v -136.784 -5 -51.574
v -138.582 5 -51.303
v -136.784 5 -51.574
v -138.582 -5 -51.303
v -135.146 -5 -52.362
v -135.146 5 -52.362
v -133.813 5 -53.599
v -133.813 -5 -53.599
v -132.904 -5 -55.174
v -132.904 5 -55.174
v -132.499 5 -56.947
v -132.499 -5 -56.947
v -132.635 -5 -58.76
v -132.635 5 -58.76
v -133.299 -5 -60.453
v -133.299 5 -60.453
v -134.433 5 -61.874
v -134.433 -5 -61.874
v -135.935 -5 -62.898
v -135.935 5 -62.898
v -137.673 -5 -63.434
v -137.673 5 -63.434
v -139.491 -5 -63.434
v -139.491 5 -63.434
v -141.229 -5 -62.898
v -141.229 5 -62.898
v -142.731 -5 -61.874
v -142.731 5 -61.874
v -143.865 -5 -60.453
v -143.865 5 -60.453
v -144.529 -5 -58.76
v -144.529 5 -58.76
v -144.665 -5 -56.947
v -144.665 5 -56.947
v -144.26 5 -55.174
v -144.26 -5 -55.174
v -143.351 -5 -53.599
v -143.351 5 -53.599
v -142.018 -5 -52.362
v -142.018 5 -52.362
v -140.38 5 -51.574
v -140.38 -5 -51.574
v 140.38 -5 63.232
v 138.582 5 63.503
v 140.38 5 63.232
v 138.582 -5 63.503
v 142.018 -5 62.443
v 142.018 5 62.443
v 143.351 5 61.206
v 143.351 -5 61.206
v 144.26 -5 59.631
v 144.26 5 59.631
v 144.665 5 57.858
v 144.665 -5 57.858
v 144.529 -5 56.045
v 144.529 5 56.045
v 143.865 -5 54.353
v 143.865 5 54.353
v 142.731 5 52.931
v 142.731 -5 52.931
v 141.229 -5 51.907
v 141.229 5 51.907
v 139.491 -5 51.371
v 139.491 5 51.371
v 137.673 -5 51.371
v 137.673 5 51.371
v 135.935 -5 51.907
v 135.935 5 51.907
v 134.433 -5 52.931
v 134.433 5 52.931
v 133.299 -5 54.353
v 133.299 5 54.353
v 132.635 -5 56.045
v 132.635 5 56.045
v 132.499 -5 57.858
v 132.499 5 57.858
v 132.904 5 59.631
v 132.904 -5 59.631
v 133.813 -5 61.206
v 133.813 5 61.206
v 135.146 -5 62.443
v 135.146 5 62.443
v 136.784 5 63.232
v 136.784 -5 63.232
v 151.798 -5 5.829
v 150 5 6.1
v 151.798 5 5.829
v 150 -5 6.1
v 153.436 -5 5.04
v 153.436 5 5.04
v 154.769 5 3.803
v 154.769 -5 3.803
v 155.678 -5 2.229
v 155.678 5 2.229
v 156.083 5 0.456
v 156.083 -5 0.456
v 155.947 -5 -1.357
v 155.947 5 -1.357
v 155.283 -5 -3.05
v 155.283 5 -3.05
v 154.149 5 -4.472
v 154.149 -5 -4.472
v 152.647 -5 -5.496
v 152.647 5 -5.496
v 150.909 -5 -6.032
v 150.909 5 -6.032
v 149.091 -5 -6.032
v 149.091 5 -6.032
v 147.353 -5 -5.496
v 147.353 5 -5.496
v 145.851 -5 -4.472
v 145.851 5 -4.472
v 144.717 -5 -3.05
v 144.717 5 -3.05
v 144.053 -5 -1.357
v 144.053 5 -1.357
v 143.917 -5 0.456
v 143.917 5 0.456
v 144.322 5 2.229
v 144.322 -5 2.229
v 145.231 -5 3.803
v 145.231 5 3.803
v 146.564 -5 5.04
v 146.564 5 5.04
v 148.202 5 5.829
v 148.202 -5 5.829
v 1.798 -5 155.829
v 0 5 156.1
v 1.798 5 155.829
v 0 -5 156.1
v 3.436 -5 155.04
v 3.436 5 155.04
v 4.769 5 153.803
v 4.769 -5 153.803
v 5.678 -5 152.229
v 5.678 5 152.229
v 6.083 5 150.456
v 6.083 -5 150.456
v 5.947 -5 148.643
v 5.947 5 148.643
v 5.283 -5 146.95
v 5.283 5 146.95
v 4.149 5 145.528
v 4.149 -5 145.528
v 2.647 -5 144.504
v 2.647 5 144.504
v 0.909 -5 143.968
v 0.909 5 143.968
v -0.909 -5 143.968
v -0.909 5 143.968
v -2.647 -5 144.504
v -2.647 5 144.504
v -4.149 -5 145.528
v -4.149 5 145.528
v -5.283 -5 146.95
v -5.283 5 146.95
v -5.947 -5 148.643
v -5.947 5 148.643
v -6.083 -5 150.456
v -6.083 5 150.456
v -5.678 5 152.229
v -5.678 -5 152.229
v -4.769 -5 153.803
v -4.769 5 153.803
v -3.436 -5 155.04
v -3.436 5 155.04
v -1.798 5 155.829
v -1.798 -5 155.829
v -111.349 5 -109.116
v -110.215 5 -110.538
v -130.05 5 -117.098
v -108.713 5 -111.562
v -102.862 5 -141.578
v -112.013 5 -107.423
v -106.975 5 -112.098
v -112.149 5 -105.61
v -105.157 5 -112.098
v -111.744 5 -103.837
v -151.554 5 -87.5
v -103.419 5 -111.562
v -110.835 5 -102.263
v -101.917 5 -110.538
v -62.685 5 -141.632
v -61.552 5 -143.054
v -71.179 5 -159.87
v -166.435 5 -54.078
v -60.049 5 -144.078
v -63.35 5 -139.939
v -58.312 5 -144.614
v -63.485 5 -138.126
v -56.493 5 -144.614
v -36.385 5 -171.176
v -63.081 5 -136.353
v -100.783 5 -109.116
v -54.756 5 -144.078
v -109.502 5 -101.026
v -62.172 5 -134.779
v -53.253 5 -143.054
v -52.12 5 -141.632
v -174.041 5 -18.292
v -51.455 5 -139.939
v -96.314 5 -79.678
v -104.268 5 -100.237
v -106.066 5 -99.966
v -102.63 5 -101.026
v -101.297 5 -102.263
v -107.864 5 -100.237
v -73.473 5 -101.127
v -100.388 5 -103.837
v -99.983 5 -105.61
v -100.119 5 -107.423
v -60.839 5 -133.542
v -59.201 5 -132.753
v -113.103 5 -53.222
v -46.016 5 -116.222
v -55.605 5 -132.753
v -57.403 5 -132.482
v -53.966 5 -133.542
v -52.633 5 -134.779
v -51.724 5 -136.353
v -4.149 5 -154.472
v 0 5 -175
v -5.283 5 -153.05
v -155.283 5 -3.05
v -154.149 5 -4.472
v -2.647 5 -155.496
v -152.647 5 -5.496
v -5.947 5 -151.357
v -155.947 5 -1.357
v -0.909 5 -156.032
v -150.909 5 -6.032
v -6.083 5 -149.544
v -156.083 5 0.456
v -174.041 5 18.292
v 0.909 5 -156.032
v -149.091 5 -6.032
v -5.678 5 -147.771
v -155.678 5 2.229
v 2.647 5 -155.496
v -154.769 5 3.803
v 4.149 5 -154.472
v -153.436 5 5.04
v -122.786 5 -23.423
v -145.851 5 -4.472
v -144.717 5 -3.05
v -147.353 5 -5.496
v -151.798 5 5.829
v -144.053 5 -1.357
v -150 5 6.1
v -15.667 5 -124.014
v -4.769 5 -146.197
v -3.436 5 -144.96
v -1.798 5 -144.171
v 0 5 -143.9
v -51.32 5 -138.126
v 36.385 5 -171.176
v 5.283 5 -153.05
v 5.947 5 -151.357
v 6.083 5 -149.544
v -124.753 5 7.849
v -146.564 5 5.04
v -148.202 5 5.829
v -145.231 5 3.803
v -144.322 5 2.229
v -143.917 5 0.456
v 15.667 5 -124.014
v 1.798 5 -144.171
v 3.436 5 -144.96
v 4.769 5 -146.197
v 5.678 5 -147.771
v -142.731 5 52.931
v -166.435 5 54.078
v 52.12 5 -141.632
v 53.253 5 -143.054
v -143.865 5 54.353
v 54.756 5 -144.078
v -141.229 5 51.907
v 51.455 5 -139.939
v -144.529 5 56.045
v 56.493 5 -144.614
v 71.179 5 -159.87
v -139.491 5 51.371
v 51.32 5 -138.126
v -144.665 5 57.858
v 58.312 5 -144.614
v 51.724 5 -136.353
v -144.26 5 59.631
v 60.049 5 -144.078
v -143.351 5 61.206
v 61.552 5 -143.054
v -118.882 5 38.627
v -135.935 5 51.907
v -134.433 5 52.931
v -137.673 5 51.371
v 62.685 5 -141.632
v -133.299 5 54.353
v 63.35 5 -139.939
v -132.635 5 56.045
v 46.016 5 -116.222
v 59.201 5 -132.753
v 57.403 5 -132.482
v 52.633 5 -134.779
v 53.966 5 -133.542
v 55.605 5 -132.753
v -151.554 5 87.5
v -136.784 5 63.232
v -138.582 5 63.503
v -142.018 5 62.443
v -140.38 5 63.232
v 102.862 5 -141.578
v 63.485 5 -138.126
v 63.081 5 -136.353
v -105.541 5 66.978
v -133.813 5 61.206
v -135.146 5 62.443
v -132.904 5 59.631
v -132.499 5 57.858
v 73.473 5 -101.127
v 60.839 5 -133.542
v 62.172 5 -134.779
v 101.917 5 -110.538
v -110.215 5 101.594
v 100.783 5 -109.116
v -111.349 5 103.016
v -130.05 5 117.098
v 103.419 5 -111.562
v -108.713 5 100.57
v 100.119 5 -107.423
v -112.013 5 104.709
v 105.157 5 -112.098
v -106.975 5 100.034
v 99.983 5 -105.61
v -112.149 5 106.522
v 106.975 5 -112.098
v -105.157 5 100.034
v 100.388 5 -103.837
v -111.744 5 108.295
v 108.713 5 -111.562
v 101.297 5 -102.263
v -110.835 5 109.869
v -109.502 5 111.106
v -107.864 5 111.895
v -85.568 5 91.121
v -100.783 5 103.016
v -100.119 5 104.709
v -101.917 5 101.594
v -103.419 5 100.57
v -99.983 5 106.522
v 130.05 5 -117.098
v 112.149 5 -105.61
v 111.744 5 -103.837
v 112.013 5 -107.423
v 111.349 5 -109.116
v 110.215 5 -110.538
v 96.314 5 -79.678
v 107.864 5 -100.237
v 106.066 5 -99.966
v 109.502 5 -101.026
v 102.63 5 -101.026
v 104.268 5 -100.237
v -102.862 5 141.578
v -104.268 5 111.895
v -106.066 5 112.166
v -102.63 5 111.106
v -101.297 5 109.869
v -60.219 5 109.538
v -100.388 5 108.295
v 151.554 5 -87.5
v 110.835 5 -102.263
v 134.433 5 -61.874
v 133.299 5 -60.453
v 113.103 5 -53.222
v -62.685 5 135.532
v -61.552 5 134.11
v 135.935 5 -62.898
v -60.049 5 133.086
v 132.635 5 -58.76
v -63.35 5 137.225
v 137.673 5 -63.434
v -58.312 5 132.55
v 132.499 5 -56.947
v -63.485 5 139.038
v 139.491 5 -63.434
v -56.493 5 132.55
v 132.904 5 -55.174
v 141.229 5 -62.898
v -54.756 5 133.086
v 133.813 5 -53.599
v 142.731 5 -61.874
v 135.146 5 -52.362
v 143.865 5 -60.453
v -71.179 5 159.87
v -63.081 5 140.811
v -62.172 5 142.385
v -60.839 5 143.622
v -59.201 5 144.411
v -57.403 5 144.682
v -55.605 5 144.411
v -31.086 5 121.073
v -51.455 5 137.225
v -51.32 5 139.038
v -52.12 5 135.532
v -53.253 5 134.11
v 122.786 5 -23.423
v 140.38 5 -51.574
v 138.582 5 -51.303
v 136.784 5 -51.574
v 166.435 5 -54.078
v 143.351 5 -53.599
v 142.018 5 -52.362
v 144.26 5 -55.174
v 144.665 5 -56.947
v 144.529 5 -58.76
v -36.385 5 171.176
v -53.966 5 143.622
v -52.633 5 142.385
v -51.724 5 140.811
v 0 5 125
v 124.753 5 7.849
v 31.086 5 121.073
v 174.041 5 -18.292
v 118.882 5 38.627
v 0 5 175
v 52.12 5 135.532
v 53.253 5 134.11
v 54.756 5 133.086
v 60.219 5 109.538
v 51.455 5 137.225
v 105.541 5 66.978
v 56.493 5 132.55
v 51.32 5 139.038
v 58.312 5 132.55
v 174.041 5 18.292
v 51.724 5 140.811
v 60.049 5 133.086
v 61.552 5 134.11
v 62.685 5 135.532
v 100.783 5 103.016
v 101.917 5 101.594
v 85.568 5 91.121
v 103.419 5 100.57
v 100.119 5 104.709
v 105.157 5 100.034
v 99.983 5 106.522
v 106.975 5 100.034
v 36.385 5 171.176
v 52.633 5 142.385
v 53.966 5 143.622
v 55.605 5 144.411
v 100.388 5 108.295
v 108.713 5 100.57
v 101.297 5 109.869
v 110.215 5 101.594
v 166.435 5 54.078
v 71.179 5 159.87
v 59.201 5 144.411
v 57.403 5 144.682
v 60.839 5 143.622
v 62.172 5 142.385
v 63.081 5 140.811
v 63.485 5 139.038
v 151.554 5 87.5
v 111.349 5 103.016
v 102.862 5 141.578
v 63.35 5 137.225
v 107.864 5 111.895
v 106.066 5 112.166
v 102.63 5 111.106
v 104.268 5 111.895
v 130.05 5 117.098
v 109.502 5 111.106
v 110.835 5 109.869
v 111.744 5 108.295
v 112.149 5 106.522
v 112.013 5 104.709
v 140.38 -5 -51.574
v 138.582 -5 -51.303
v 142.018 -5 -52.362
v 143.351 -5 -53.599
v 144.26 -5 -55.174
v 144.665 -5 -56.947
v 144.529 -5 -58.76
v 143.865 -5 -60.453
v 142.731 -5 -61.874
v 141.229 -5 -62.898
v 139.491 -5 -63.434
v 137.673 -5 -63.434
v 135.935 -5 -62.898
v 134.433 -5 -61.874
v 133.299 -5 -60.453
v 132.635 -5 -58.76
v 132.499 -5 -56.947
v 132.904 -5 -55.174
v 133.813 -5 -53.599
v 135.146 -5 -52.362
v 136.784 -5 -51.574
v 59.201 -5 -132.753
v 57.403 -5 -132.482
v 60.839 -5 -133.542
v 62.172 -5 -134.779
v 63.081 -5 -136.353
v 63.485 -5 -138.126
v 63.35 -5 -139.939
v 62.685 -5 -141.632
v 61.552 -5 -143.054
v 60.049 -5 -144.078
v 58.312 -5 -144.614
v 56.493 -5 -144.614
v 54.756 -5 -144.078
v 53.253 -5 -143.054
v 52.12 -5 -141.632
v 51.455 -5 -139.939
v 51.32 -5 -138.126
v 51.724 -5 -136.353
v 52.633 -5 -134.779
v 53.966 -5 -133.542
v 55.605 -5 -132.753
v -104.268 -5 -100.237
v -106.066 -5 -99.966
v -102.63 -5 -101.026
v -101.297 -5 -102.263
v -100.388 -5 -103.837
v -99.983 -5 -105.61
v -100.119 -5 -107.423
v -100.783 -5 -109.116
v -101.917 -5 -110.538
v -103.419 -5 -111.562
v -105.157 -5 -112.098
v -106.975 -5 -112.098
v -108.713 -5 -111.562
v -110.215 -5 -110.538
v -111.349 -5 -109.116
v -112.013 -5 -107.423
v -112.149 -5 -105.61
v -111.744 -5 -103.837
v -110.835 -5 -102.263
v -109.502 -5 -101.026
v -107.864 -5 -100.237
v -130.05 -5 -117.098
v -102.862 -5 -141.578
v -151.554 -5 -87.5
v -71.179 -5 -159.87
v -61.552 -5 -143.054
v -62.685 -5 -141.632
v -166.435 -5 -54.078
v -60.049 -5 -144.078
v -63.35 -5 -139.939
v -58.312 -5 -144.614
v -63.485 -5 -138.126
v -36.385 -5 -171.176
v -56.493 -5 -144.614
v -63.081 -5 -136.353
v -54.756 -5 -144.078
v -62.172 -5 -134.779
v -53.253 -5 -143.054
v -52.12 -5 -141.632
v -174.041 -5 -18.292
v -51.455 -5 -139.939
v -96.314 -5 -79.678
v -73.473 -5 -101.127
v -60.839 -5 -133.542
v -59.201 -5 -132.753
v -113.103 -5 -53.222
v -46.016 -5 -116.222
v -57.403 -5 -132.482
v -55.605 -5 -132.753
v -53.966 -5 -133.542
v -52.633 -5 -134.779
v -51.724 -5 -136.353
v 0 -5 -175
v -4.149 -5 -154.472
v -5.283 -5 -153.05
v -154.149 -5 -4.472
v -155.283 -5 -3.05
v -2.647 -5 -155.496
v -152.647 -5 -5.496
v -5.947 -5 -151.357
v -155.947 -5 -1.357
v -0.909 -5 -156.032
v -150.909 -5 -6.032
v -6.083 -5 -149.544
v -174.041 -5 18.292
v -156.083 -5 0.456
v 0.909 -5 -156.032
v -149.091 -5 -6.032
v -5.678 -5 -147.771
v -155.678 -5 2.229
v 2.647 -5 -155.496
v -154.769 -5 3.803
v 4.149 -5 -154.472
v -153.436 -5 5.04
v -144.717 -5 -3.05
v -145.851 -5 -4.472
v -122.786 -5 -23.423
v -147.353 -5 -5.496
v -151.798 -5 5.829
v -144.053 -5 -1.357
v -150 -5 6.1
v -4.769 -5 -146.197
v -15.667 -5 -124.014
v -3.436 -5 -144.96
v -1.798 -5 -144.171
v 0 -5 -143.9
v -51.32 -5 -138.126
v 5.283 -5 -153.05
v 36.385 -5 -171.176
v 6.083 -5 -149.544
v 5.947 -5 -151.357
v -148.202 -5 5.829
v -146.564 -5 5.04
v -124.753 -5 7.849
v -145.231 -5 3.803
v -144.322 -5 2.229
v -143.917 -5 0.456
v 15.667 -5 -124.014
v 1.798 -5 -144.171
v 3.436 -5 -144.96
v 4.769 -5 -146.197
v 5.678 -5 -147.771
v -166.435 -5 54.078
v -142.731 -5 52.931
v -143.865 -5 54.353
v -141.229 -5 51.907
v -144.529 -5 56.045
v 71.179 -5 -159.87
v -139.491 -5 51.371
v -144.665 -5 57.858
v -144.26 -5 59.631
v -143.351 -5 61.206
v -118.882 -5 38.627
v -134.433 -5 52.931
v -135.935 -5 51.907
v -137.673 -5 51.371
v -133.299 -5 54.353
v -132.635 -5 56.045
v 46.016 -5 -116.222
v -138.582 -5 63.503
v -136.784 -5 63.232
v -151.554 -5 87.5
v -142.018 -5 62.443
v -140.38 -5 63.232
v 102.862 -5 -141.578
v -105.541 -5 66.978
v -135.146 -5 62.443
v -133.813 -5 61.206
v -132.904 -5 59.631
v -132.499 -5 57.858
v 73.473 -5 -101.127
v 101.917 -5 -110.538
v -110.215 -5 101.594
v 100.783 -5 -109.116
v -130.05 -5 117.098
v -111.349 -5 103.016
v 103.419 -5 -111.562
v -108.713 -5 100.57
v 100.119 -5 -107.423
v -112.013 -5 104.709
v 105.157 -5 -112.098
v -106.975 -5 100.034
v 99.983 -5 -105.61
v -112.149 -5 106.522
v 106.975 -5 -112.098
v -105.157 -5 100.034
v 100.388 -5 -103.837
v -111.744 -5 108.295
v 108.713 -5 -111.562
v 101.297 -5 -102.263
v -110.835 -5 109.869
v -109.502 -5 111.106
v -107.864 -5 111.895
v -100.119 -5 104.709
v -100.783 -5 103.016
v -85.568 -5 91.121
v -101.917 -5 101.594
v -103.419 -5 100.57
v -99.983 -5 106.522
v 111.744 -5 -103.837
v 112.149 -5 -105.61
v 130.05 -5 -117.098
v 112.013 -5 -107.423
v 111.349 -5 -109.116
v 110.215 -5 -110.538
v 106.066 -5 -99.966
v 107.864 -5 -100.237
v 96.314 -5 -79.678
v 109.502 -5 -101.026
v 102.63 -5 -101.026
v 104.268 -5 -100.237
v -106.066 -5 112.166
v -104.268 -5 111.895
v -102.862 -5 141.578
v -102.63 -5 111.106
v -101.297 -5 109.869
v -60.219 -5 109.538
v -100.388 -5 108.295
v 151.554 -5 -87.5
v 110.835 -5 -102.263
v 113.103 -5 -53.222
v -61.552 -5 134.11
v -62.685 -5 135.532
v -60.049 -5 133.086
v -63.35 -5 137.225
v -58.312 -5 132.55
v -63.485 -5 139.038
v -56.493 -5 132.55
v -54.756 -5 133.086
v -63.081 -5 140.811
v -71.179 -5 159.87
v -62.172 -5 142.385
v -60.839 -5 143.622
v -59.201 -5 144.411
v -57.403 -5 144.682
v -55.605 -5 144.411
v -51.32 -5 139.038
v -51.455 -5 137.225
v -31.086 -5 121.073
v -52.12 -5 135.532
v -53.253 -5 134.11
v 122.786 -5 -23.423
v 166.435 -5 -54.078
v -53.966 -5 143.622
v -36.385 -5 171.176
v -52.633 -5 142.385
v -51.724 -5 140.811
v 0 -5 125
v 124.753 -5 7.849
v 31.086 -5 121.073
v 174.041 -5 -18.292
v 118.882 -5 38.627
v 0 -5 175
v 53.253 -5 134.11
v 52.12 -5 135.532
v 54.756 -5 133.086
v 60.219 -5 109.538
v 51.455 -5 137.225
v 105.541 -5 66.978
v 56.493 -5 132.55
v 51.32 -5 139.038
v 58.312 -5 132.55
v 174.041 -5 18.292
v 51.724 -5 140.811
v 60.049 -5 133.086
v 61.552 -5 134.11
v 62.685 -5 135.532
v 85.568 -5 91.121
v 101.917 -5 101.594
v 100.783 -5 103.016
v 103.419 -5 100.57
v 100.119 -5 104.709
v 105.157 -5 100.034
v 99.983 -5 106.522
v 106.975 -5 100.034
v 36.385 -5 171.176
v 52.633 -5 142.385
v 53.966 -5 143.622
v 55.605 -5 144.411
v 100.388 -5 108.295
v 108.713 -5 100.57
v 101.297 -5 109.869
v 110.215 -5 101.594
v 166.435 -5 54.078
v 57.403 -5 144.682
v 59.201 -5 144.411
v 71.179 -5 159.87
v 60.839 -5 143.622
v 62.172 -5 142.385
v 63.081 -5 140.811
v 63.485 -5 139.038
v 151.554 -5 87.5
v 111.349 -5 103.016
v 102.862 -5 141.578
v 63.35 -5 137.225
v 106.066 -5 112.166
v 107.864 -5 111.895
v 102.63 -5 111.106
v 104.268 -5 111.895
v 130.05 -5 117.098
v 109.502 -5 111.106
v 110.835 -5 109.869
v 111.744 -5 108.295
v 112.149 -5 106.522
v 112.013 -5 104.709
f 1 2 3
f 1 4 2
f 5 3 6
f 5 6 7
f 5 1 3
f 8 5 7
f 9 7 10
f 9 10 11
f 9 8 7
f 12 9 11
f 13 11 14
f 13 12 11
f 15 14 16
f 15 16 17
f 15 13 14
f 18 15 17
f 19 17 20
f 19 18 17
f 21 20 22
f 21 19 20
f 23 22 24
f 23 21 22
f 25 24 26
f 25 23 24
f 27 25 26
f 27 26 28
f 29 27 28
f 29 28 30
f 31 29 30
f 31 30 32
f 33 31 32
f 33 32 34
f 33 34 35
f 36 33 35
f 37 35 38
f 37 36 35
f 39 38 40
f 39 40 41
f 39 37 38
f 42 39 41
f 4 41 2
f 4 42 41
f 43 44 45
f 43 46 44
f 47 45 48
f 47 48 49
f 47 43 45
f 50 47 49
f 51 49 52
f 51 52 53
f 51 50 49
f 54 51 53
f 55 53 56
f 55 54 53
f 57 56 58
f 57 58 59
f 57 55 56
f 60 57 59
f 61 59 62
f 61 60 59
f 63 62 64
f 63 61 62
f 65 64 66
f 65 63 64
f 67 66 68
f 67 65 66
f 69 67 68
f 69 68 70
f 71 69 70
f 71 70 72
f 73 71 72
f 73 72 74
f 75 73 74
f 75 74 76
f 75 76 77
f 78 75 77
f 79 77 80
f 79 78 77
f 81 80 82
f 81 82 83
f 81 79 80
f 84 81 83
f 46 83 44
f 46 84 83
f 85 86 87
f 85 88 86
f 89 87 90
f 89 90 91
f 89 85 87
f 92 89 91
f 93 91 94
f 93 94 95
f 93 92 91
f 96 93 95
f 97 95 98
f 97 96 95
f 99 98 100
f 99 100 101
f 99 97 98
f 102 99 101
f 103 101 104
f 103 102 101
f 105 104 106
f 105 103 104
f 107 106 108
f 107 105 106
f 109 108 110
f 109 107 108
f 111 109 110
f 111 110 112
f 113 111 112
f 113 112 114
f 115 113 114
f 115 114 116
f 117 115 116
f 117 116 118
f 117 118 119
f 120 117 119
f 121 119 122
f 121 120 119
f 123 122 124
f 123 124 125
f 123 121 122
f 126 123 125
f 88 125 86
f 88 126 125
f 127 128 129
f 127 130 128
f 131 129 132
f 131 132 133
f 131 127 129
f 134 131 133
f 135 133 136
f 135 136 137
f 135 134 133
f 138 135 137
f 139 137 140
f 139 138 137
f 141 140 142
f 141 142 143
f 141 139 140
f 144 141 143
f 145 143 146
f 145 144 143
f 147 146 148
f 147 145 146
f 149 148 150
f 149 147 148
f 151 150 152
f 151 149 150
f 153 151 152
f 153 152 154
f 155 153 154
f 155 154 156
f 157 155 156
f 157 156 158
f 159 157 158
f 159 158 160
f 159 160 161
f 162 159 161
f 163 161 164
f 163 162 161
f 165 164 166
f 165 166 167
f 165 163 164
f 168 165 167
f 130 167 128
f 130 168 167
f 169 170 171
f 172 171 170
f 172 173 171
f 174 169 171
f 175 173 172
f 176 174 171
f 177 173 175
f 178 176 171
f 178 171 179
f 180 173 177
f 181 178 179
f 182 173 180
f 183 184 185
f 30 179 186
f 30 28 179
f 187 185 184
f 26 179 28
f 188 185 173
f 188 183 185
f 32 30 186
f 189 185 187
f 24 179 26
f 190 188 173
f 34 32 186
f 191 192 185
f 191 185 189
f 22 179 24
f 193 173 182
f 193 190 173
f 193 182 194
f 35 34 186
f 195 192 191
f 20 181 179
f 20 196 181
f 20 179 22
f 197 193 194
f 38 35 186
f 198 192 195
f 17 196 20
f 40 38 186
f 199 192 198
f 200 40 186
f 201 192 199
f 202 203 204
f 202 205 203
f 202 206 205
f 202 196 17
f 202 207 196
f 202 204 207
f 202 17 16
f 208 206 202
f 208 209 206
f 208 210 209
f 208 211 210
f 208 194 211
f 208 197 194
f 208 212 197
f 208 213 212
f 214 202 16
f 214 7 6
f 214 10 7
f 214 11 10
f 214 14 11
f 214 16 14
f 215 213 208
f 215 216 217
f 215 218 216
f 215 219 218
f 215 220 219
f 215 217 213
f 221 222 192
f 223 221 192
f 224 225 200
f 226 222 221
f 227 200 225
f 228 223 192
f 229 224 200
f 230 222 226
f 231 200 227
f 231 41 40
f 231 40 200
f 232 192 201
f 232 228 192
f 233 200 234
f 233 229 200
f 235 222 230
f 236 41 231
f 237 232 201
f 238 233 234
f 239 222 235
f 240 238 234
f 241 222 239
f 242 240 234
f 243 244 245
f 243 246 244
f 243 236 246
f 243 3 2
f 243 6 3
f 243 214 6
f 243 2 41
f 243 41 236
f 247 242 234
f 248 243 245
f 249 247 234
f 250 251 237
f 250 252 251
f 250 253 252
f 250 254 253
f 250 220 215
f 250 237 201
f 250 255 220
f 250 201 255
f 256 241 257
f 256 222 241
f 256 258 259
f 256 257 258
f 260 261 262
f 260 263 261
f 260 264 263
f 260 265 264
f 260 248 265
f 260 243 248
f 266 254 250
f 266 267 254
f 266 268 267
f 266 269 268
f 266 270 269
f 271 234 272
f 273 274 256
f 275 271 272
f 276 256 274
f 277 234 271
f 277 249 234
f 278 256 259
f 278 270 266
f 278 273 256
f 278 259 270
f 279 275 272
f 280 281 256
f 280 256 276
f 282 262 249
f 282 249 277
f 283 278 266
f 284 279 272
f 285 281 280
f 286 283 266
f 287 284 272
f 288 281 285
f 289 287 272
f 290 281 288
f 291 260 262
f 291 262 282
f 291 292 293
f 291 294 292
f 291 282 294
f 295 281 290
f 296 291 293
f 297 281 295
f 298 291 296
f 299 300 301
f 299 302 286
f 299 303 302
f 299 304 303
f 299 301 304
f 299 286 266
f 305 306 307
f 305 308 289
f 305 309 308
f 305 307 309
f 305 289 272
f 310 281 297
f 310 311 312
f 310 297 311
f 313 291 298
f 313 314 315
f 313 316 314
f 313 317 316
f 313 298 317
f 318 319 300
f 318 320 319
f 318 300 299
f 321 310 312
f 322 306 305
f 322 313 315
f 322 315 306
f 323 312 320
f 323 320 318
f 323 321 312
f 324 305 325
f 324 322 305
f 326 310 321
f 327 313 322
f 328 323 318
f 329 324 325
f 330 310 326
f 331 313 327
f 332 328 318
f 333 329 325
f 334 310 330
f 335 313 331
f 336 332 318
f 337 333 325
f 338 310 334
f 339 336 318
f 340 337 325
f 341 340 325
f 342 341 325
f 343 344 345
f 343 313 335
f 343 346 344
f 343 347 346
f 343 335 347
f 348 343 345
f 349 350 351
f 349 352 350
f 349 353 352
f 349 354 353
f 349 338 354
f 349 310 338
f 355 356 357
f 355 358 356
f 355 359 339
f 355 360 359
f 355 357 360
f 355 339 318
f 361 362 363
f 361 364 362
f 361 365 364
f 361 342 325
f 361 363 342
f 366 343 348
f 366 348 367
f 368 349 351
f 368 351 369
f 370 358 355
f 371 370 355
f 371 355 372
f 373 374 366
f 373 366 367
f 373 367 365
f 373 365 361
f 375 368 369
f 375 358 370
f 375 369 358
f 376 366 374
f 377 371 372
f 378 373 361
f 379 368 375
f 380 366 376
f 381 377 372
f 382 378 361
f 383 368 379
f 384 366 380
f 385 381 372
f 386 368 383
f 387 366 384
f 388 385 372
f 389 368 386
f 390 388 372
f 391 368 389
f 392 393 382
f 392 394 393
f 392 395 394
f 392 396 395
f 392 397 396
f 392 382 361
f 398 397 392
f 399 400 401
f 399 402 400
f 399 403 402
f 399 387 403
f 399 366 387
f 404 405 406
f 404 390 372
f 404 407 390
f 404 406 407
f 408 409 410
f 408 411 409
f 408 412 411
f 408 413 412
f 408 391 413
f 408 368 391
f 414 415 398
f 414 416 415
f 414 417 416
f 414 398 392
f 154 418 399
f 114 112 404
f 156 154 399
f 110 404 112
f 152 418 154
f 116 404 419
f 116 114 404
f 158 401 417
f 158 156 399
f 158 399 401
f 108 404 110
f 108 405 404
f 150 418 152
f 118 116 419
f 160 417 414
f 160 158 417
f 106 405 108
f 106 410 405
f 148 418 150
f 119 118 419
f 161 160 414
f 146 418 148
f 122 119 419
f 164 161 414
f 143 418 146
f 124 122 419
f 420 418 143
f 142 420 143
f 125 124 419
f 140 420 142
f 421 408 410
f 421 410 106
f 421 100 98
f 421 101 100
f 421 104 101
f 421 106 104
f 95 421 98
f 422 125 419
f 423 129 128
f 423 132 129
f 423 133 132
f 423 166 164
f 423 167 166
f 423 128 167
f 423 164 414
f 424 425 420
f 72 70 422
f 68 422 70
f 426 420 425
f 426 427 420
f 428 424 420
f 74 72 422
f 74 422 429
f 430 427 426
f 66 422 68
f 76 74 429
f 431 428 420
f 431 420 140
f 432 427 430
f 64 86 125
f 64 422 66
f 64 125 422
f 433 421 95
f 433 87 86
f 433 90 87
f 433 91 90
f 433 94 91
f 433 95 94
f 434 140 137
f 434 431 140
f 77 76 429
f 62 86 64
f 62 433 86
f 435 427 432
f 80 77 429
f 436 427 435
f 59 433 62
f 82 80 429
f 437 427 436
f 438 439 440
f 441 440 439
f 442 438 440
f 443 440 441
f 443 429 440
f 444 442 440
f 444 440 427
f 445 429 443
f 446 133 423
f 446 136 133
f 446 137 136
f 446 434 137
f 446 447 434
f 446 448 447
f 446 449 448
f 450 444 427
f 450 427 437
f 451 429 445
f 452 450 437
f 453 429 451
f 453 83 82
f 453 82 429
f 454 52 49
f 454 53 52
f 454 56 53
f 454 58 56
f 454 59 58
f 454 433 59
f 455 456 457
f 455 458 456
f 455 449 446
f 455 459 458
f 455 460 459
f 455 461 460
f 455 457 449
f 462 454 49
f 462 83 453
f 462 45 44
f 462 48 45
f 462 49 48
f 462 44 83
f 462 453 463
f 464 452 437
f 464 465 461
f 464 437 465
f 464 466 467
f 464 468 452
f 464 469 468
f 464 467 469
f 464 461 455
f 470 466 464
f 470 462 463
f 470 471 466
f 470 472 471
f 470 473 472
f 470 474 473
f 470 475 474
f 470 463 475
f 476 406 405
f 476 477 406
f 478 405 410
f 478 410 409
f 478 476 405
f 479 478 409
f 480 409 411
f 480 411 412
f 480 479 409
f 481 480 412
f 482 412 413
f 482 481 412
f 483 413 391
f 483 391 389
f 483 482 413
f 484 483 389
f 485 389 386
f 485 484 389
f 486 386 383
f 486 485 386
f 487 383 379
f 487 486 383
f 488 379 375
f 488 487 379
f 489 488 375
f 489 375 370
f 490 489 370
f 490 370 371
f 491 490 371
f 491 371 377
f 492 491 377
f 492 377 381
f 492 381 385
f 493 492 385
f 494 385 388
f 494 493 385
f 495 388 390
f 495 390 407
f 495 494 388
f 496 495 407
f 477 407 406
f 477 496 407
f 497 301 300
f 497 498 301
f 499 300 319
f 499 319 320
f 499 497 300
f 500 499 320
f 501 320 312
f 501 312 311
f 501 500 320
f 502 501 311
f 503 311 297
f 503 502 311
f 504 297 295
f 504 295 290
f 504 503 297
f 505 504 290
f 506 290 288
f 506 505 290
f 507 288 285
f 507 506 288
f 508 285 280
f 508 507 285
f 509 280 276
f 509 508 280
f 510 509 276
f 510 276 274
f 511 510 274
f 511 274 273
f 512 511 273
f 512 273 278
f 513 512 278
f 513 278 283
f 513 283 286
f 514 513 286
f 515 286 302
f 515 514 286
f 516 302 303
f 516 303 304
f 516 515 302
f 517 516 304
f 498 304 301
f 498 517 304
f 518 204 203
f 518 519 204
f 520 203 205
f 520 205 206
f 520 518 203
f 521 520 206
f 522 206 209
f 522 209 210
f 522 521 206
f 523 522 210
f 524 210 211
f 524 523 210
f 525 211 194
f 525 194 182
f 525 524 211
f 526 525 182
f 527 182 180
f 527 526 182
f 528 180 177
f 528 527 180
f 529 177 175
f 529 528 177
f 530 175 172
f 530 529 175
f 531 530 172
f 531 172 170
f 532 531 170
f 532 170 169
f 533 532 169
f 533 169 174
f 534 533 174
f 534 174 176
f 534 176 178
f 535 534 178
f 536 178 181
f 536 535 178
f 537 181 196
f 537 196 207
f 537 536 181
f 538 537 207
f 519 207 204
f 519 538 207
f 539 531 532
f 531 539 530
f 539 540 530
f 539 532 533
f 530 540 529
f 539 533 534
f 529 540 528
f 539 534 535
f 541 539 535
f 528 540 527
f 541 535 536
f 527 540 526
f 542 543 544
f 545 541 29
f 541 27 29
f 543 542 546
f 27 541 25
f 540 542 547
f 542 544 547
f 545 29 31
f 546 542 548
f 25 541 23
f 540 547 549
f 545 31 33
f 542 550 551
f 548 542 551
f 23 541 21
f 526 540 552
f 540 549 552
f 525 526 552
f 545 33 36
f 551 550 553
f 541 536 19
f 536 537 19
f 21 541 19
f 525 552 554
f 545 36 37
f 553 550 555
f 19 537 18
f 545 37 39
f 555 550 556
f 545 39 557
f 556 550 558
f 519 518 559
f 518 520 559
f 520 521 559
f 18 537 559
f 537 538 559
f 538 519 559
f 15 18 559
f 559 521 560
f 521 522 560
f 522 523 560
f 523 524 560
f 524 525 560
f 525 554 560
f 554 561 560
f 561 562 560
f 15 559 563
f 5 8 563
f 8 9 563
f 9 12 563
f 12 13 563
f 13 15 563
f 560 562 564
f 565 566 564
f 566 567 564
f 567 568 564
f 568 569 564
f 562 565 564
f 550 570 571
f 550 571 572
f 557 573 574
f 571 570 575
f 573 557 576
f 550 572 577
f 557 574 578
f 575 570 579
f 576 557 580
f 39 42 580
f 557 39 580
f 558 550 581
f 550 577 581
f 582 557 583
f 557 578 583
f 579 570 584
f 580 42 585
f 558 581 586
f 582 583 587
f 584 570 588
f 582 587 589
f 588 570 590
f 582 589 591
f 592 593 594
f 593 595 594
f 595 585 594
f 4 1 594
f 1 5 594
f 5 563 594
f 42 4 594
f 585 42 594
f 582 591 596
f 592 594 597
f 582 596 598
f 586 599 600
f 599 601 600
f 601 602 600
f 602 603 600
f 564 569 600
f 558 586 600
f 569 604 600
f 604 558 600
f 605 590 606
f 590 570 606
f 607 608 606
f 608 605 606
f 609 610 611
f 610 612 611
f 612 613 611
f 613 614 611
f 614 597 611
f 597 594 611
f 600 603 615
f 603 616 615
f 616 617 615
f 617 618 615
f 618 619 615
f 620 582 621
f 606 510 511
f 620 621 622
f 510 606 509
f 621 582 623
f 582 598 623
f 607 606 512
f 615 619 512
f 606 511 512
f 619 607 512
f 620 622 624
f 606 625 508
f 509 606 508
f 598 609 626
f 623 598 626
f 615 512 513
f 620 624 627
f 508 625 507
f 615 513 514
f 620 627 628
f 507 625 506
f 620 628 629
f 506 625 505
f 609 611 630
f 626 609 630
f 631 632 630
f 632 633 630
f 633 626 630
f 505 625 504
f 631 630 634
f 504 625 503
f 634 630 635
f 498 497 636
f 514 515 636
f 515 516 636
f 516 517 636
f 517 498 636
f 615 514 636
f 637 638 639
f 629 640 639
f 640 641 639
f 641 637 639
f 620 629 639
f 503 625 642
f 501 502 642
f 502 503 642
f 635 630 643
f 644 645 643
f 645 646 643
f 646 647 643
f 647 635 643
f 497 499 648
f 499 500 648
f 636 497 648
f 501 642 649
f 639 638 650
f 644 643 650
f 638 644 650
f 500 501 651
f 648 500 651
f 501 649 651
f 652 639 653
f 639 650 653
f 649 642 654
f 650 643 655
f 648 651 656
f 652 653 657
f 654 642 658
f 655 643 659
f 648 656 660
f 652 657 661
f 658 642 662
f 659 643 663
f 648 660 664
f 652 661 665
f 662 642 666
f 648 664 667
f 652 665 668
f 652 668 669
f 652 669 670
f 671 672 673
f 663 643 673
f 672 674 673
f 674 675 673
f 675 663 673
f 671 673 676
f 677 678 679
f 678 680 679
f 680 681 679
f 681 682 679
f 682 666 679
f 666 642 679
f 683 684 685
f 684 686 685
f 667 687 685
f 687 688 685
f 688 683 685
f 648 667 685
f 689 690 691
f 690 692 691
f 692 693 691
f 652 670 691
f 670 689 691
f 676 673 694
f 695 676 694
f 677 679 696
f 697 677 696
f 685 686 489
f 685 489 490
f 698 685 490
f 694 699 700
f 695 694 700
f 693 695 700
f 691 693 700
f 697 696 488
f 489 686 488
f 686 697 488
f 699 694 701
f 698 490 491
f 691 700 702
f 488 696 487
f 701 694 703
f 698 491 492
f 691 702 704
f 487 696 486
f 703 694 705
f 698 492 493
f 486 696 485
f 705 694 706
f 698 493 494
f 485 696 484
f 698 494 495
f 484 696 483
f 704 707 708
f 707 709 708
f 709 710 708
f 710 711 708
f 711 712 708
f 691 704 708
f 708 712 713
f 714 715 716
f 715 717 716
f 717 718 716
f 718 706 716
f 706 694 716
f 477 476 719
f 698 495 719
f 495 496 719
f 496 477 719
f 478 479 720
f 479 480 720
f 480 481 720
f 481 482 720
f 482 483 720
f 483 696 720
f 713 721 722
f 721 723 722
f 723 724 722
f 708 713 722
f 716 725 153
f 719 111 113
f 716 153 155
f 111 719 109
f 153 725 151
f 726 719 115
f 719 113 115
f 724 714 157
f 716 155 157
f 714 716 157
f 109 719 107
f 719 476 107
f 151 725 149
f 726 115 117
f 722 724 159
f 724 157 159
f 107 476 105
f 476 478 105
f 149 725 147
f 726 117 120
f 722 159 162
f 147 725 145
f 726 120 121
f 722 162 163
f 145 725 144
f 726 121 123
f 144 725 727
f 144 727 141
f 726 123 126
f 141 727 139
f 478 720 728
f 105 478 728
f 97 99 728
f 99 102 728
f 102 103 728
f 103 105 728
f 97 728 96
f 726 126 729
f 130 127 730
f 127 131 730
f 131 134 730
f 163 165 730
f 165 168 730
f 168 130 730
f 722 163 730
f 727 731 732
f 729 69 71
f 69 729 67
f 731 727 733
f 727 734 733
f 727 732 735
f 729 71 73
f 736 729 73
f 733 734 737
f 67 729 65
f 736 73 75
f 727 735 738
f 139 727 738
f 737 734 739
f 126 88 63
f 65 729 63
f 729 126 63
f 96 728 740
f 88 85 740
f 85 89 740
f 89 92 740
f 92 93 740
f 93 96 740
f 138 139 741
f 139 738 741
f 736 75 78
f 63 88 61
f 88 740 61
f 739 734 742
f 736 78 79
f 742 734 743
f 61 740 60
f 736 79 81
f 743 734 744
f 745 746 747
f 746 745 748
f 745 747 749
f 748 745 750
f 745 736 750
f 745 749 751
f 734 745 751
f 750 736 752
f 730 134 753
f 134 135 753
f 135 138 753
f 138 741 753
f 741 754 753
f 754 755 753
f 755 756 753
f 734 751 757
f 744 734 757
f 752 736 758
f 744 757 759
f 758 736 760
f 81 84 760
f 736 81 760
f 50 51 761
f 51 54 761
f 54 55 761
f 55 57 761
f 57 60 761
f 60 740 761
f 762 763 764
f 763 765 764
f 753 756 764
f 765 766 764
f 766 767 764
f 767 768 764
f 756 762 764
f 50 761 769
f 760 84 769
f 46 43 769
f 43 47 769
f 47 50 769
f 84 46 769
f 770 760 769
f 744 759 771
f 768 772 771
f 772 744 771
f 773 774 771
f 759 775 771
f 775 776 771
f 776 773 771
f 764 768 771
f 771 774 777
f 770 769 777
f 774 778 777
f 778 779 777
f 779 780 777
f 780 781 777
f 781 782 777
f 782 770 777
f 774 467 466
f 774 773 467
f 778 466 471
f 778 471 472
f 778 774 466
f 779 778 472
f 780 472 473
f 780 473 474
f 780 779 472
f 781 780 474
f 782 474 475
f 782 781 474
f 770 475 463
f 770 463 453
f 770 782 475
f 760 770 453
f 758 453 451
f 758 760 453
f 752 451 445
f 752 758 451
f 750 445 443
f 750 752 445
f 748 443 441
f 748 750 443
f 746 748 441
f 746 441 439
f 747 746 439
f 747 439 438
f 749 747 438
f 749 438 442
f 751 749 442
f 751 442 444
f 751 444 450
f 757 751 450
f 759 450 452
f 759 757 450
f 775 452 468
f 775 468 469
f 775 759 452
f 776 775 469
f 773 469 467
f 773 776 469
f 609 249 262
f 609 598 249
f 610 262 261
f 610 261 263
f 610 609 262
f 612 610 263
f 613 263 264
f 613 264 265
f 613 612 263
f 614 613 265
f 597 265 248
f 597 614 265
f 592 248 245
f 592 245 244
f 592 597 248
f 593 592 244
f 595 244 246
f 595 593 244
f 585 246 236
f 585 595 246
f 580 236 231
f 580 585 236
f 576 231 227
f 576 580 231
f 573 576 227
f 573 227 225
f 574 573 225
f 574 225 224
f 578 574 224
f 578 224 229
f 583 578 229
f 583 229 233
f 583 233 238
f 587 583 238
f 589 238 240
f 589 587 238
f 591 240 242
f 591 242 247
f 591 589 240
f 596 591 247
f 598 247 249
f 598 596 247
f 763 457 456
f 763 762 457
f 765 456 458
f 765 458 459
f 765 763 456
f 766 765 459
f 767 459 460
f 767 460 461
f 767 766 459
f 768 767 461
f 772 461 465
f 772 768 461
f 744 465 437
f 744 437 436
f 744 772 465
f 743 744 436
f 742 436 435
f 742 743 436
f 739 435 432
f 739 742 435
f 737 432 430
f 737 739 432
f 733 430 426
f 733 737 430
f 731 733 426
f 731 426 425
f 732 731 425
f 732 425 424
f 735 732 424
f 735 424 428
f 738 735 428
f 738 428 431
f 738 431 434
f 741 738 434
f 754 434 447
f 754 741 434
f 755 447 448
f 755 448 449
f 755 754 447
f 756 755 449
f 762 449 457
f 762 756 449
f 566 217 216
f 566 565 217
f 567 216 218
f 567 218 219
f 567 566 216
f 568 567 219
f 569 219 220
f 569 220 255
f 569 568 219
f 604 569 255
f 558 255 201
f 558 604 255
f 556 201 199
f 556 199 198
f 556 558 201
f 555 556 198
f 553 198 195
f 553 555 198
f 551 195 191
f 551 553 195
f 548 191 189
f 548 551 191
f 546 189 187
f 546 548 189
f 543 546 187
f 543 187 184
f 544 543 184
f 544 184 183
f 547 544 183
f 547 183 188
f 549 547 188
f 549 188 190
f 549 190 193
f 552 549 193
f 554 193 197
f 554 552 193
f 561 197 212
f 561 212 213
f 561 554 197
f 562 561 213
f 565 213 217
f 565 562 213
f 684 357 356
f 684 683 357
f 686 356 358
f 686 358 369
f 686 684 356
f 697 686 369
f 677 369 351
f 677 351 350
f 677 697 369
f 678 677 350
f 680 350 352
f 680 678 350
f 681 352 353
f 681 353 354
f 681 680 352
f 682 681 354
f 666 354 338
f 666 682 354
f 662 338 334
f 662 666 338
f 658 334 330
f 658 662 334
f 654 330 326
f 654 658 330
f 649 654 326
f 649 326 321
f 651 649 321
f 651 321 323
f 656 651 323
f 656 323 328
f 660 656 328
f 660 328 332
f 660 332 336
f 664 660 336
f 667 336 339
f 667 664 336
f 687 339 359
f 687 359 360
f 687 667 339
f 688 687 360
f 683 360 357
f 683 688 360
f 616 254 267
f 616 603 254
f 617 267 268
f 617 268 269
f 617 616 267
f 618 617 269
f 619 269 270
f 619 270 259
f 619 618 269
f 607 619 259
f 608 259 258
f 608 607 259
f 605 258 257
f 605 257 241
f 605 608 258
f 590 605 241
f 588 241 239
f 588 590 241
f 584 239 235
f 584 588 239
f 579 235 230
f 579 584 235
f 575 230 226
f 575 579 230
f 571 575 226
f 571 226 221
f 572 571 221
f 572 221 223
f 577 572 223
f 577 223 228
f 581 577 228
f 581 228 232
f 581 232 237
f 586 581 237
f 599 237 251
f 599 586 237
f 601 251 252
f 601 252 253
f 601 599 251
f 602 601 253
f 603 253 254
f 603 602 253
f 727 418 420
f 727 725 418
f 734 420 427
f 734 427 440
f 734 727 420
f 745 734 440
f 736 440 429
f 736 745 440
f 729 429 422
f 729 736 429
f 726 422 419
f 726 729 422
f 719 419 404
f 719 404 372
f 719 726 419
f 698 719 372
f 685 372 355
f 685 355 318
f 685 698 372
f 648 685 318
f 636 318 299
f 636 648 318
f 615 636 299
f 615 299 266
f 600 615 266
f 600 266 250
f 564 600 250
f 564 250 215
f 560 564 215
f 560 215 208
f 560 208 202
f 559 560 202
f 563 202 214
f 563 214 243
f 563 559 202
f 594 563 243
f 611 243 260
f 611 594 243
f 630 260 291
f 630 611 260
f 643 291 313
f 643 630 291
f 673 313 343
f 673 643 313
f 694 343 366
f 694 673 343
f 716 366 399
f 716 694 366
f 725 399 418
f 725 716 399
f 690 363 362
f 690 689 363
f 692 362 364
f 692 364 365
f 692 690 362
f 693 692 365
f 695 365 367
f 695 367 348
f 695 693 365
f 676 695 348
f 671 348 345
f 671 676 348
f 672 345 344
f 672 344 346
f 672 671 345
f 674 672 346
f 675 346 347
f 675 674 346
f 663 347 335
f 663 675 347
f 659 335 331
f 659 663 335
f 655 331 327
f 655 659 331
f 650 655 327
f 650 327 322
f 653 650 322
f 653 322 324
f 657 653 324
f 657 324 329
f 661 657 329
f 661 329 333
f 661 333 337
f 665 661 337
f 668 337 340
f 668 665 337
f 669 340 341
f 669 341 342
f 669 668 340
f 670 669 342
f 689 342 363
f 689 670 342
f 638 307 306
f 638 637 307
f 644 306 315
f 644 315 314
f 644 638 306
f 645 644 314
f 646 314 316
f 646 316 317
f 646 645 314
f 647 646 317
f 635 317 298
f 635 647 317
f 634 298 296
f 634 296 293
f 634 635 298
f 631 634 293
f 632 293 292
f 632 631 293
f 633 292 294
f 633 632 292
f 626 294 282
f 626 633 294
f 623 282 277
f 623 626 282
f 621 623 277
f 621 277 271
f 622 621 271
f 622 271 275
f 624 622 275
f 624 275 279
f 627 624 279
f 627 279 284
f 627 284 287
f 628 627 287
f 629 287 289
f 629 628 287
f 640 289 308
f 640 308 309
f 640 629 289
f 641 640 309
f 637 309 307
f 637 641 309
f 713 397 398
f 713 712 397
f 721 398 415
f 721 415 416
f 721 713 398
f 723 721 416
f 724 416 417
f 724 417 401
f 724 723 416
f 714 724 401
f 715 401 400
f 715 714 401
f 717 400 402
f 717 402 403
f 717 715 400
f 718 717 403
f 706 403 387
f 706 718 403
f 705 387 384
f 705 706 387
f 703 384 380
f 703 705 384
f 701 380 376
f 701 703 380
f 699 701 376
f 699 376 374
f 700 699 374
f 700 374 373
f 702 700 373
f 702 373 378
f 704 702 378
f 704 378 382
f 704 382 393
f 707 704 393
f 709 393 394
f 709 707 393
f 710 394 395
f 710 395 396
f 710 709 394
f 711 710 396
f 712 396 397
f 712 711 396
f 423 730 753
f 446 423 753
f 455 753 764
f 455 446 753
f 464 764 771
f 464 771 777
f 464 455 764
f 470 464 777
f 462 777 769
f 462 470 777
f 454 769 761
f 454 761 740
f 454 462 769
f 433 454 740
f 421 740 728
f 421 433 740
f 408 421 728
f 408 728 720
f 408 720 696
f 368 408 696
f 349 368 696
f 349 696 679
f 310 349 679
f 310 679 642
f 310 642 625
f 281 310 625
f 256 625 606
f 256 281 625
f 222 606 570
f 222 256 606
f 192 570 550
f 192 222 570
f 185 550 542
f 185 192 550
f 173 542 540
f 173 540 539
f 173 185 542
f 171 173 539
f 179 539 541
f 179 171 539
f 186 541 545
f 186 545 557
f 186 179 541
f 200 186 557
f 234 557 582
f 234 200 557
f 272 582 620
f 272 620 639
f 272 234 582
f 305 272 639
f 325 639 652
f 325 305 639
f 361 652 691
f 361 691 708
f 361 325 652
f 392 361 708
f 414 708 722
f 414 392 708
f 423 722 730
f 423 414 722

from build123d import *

# Parameters (mm, degrees)
SKETCH1_R           = 175
SKETCH1_R_2         = 125
SKETCH1_R_3         = 6.1
BOSS_EXTRUDE1_DEPTH = 5


with BuildPart() as part:
    # Sketch1 → Boss-Extrude1 (new, symmetric)
    with BuildSketch(Plane(origin=(0, 0, 0), x_dir=(1, 0, 0), z_dir=(0, 1, 0))):
        with Locations(Location((0, 0, 0), (0, 0, 270))):
            Circle(SKETCH1_R)
        with Locations(Location((0, 0, 0), (0, 0, 270))):
            Circle(SKETCH1_R_2, mode=Mode.SUBTRACT)
        with Locations(Location((0, 150, 0), (0, 0, 270))):
            Circle(SKETCH1_R_3, mode=Mode.SUBTRACT)
        with Locations(Location((57.402514855, 138.581929877, 0), (0, 0, 270))):
            Circle(SKETCH1_R_3, mode=Mode.SUBTRACT)
        with Locations(Location((106.066017178, 106.066017178, 0), (0, 0, 270))):
            Circle(SKETCH1_R_3, mode=Mode.SUBTRACT)
        with Locations(Location((138.581929877, 57.402514855, 0), (0, 0, 270))):
            Circle(SKETCH1_R_3, mode=Mode.SUBTRACT)
        with Locations(Location((150, 0, 0), (0, 0, 270))):
            Circle(SKETCH1_R_3, mode=Mode.SUBTRACT)
        with Locations(Location((138.581929877, -57.402514855, 0), (0, 0, 270))):
            Circle(SKETCH1_R_3, mode=Mode.SUBTRACT)
        with Locations(Location((106.066017178, -106.066017178, 0), (0, 0, 270))):
            Circle(SKETCH1_R_3, mode=Mode.SUBTRACT)
        with Locations(Location((57.402514855, -138.581929877, 0), (0, 0, 270))):
            Circle(SKETCH1_R_3, mode=Mode.SUBTRACT)
        with Locations(Location((0, -150, 0), (0, 0, 270))):
            Circle(SKETCH1_R_3, mode=Mode.SUBTRACT)
        with Locations(Location((-57.402514855, -138.581929877, 0), (0, 0, 270))):
            Circle(SKETCH1_R_3, mode=Mode.SUBTRACT)
        with Locations(Location((-106.066017178, -106.066017178, 0), (0, 0, 270))):
            Circle(SKETCH1_R_3, mode=Mode.SUBTRACT)
        with Locations(Location((-138.581929877, -57.402514855, 0), (0, 0, 270))):
            Circle(SKETCH1_R_3, mode=Mode.SUBTRACT)
        with Locations(Location((-150, 0, 0), (0, 0, 270))):
            Circle(SKETCH1_R_3, mode=Mode.SUBTRACT)
        with Locations(Location((-138.581929877, 57.402514855, 0), (0, 0, 270))):
            Circle(SKETCH1_R_3, mode=Mode.SUBTRACT)
        with Locations(Location((-106.066017178, 106.066017178, 0), (0, 0, 270))):
            Circle(SKETCH1_R_3, mode=Mode.SUBTRACT)
        with Locations(Location((-57.402514855, 138.581929877, 0), (0, 0, 270))):
            Circle(SKETCH1_R_3, mode=Mode.SUBTRACT)
    extrude(amount=BOSS_EXTRUDE1_DEPTH, both=True)


solid = part.part
